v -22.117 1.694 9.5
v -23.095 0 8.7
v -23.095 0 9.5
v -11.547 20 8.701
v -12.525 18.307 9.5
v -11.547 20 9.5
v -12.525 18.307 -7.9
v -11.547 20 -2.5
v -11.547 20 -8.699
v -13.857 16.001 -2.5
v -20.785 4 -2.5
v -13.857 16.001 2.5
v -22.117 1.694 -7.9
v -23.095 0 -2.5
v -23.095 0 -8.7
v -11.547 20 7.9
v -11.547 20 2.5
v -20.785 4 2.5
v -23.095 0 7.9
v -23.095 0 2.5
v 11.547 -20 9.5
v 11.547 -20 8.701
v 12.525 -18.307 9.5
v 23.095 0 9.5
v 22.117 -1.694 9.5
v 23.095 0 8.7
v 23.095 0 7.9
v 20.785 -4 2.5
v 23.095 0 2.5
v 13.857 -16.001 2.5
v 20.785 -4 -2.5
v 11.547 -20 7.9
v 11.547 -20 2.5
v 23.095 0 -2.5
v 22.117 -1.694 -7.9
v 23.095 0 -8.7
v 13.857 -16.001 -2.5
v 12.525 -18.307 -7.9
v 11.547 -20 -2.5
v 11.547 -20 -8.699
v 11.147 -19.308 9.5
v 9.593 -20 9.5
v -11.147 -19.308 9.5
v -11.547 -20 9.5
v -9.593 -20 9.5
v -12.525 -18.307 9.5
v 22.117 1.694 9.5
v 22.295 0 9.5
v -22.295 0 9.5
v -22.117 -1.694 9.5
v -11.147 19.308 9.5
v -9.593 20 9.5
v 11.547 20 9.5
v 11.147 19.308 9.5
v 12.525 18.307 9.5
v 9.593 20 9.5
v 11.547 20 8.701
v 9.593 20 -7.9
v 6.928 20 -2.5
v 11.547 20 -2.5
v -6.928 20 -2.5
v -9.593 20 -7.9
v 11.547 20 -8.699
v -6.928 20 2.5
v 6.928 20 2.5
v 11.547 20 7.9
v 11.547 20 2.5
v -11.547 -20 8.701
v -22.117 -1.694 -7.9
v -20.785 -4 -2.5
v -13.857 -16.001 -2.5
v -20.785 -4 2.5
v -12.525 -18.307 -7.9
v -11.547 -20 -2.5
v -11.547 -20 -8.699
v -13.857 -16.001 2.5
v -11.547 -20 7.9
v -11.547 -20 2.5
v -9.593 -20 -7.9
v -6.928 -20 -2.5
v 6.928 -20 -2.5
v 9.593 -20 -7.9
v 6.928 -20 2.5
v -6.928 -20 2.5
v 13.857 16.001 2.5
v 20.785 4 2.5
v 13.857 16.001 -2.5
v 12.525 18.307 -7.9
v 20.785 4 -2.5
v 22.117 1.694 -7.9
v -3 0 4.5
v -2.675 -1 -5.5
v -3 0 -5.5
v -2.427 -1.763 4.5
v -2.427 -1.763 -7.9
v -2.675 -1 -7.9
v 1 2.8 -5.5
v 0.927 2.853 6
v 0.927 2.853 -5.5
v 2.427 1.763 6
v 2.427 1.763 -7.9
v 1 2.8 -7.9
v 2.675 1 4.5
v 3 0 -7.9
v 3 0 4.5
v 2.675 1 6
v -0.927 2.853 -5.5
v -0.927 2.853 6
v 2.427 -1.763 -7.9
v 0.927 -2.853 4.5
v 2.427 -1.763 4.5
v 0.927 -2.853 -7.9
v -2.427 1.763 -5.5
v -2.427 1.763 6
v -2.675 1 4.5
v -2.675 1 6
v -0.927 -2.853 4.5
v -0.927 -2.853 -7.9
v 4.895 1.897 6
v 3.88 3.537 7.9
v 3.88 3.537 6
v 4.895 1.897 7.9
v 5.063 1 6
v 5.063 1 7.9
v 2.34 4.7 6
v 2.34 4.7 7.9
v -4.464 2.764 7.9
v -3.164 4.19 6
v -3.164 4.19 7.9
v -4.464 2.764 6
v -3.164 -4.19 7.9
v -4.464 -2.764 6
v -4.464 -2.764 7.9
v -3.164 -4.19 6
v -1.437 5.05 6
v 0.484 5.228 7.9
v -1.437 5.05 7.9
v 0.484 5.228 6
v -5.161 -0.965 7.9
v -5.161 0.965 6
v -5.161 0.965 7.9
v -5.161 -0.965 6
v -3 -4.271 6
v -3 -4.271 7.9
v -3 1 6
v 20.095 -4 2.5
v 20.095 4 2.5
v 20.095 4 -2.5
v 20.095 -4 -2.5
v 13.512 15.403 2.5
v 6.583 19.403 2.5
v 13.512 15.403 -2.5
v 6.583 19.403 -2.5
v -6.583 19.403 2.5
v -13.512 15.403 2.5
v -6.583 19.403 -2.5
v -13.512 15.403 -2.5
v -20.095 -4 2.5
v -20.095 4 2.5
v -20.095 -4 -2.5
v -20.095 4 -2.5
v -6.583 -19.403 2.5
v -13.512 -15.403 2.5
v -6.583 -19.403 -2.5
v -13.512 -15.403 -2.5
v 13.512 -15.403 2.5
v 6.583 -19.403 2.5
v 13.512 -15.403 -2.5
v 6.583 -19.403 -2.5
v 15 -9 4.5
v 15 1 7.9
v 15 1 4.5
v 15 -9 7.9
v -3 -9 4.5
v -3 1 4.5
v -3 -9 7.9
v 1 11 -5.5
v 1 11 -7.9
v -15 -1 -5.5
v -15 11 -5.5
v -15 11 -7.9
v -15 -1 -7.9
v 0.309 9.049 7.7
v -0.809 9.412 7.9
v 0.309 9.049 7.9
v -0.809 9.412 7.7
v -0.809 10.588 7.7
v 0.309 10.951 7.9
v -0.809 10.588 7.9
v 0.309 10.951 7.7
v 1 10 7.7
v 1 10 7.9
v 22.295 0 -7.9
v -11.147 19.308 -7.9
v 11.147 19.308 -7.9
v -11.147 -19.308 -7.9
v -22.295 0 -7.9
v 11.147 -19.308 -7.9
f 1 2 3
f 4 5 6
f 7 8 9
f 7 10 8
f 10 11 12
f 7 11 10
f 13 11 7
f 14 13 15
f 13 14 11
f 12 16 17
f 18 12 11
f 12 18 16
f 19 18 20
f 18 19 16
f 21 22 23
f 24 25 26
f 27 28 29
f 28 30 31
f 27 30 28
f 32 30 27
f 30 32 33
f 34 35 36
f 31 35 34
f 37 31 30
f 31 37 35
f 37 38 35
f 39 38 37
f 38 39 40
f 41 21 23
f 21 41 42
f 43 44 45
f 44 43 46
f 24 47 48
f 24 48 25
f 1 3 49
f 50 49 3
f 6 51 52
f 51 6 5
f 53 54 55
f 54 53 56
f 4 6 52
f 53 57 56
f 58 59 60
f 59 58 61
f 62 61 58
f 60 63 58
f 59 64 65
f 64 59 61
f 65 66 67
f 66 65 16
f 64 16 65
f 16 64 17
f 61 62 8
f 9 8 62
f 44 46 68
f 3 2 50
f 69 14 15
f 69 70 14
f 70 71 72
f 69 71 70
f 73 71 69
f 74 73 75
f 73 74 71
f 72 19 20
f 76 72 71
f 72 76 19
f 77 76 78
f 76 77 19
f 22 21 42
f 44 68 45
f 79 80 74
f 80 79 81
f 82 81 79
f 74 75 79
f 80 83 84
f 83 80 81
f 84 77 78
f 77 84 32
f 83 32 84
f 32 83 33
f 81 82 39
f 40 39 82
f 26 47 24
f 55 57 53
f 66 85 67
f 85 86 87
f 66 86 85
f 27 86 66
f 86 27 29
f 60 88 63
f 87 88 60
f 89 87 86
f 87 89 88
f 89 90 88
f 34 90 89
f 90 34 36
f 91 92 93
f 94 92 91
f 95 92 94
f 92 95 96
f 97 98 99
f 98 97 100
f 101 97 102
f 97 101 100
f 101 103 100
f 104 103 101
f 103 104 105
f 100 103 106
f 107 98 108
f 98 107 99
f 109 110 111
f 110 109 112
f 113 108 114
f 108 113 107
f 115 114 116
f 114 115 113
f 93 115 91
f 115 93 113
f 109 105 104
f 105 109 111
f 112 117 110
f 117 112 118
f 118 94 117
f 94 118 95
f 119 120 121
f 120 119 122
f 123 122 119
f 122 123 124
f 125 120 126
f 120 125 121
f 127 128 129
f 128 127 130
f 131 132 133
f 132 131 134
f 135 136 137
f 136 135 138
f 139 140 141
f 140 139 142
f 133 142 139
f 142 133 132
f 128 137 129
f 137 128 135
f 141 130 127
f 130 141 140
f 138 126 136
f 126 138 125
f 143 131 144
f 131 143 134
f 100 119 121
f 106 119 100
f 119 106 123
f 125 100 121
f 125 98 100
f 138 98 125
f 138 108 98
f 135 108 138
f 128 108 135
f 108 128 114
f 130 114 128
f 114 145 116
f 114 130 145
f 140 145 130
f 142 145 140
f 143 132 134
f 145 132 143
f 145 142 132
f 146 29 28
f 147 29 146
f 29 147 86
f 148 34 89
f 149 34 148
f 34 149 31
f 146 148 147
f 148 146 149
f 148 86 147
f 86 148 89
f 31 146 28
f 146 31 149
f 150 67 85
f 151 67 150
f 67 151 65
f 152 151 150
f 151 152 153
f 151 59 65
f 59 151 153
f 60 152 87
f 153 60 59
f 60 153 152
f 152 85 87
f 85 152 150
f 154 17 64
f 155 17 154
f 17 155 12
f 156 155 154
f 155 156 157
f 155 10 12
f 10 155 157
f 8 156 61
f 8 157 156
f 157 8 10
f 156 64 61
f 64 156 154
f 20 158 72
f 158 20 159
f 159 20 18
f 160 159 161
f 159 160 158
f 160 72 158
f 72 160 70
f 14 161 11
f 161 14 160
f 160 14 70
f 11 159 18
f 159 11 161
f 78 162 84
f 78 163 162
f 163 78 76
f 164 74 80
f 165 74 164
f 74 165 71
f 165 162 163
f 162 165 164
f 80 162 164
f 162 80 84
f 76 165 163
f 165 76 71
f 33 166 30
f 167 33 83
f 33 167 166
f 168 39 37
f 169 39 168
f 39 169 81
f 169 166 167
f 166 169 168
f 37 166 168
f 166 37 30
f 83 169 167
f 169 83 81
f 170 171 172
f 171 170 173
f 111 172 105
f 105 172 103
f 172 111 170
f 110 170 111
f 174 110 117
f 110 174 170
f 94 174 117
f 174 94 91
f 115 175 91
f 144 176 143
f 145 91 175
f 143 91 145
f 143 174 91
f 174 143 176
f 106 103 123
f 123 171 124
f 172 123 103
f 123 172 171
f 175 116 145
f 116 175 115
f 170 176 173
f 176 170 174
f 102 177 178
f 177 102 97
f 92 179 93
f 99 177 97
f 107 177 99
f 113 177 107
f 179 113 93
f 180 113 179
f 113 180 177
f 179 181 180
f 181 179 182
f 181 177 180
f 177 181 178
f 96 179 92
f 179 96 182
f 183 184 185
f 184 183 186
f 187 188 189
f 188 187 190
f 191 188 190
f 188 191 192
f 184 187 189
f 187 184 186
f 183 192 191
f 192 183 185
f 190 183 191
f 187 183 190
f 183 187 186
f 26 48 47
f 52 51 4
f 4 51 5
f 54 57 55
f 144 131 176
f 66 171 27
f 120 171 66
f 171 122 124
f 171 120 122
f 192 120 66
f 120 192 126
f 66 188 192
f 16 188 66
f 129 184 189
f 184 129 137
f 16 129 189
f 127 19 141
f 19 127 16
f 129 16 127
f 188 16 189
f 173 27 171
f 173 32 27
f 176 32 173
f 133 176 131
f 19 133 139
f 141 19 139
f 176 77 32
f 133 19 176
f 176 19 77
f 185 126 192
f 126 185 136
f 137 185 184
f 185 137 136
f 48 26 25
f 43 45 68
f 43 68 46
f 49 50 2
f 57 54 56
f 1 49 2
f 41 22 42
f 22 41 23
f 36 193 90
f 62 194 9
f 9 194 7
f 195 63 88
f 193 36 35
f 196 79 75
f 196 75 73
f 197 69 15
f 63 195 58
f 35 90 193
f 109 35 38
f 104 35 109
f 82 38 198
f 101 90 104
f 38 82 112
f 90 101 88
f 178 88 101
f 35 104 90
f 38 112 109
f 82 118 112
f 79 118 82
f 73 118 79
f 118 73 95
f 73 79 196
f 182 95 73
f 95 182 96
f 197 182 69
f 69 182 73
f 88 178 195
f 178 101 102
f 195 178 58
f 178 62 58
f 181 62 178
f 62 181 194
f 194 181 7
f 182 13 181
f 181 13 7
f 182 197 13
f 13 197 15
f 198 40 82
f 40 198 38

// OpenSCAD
// Parameters
bbox_X = 46.19; //[23.095:92.38:0.01]
bbox_Y = 40; //[20:80:0.01]
bbox_Z = 19; //[9.5:38:0.01]
body_thickness = 19; //[9.5:38:0.01]
hex_flat_to_flat_Y = 40; //[20:80:0.01]
hex_point_to_point_X = 46.19; //[23.095:92.38:0.01]
hole_d = 6; //[3:12:0.01]
hole_offset_X = 0; //[-5:5:0.01]
hole_offset_Y = 0; //[-5:5:0.01]
notch_count = 6; //[3:12:1]
notch_w = 8; //[4:16:0.01]
notch_d = 3; //[1.5:6:0.01]
notch_h = 3; //[1:8:0.01]
notch_z0 = 0; //[-5:5:0.01]
top_relief_w = 18; //[9:36:0.01]
top_relief_d = 10; //[5:20:0.01]
top_relief_h = 4; //[1:9:0.01]
top_relief_offset_X = 6; //[-15:15:0.01]
top_relief_offset_Y = -4; //[-15:15:0.01]
bottom_relief_w = 16; //[8:32:0.01]
bottom_relief_d = 12; //[6:24:0.01]
bottom_relief_h = 3; //[1:9:0.01]
bottom_relief_offset_X = -7; //[-15:15:0.01]
bottom_relief_offset_Y = 5; //[-15:15:0.01]
edge_chamfer = 0.8; //[0.2:2:0.01]
csk_top_d = 10.5; //[7:18:0.01]
csk_top_h = 2.5; //[1:6:0.01]
align_mark_d = 2; //[1:4:0.01]
align_mark_h = 0.8; //[0.3:2:0.01]
overlap = 1; //[0.5:2:0.01]
hex_R = 23.095; //[11.5475:46.19:0.01]
hex_r = 20; //[10:40:0.01]

// Base Shapes
module hex_main_body() {
  linear_extrude(height=body_thickness, center=true) {
    polygon(points=[
      [hex_R, 0],
      [hex_R/2, hex_r],
      [-hex_R/2, hex_r],
      [-hex_R, 0],
      [-hex_R/2, -hex_r],
      [hex_R/2, -hex_r]
    ]);
  }
}

module central_through_hole() {
  translate([hole_offset_X, hole_offset_Y, 0])
    cylinder(r=hole_d/2, h=body_thickness + 2*overlap, center=true);
}

module counterbore_or_countersink_on_hole() {
  translate([hole_offset_X, hole_offset_Y, body_thickness/2 - (csk_top_h + overlap)/2])
    cylinder(r=csk_top_d/2, h=csk_top_h + overlap, center=true);
}

module top_face_asymmetric_relief() {
  translate([top_relief_offset_X, top_relief_offset_Y, body_thickness/2 - (top_relief_h + overlap)/2])
    cube([top_relief_w, top_relief_d, top_relief_h + overlap], center=true);
}

module bottom_face_asymmetric_relief() {
  translate([bottom_relief_offset_X, bottom_relief_offset_Y, -body_thickness/2 + (bottom_relief_h + overlap)/2])
    cube([bottom_relief_w, bottom_relief_d, bottom_relief_h + overlap], center=true);
}

module perimeter_notch(angle) {
  rotate([0, 0, angle])
    translate([hex_R - (notch_d/2) + overlap, 0, notch_z0])
      cube([notch_d + 2*overlap, notch_w, notch_h + 2*overlap], center=true);
}

module edge_chamfer_top() {
  translate([0, 0, body_thickness/2 - edge_chamfer])
    cylinder(r1=hex_R + edge_chamfer, r2=hex_R - edge_chamfer, h=2*edge_chamfer, center=true);
}

module edge_chamfer_bottom() {
  translate([0, 0, -body_thickness/2 + edge_chamfer])
    cylinder(r1=hex_R + edge_chamfer, r2=hex_R - edge_chamfer, h=2*edge_chamfer, center=true);
}

module small_alignment_marks_top_1() {
  translate([hex_r/2, 0, body_thickness/2 - (align_mark_h + overlap)/2])
    cylinder(r=align_mark_d/2, h=align_mark_h + overlap, center=true);
}

module small_alignment_marks_top_2() {
  translate([0, hex_r/2, body_thickness/2 - (align_mark_h + overlap)/2])
    cylinder(r=align_mark_d/2, h=align_mark_h + overlap, center=true);
}

// Operations
module perimeter_rectangular_notches() {
  union() {
    for (i = [0:notch_count-1])
      perimeter_notch(i * 360/notch_count);
  }
}

module small_alignment_marks() {
  union() {
    small_alignment_marks_top_1();
    small_alignment_marks_top_2();
  }
}

module edge_chamfers_fillets() {
  union() {
    edge_chamfer_top();
    edge_chamfer_bottom();
  }
}

module hex_body_minus_hole() {
  difference() {
    hex_main_body();
    central_through_hole();
  }
}

module hex_body_minus_hole_minus_csk() {
  difference() {
    hex_body_minus_hole();
    counterbore_or_countersink_on_hole();
  }
}

module hex_body_minus_notches() {
  difference() {
    hex_body_minus_hole_minus_csk();
    perimeter_rectangular_notches();
  }
}

module hex_body_minus_top_relief() {
  difference() {
    hex_body_minus_notches();
    top_face_asymmetric_relief();
  }
}

module hex_body_minus_bottom_relief() {
  difference() {
    hex_body_minus_top_relief();
    bottom_face_asymmetric_relief();
  }
}

module hex_body_minus_alignment_marks() {
  difference() {
    hex_body_minus_bottom_relief();
    small_alignment_marks();
  }
}

module complete_model() {
  difference() {
    hex_body_minus_alignment_marks();
    edge_chamfers_fillets();
  }
}

// Final Output
complete_model();
